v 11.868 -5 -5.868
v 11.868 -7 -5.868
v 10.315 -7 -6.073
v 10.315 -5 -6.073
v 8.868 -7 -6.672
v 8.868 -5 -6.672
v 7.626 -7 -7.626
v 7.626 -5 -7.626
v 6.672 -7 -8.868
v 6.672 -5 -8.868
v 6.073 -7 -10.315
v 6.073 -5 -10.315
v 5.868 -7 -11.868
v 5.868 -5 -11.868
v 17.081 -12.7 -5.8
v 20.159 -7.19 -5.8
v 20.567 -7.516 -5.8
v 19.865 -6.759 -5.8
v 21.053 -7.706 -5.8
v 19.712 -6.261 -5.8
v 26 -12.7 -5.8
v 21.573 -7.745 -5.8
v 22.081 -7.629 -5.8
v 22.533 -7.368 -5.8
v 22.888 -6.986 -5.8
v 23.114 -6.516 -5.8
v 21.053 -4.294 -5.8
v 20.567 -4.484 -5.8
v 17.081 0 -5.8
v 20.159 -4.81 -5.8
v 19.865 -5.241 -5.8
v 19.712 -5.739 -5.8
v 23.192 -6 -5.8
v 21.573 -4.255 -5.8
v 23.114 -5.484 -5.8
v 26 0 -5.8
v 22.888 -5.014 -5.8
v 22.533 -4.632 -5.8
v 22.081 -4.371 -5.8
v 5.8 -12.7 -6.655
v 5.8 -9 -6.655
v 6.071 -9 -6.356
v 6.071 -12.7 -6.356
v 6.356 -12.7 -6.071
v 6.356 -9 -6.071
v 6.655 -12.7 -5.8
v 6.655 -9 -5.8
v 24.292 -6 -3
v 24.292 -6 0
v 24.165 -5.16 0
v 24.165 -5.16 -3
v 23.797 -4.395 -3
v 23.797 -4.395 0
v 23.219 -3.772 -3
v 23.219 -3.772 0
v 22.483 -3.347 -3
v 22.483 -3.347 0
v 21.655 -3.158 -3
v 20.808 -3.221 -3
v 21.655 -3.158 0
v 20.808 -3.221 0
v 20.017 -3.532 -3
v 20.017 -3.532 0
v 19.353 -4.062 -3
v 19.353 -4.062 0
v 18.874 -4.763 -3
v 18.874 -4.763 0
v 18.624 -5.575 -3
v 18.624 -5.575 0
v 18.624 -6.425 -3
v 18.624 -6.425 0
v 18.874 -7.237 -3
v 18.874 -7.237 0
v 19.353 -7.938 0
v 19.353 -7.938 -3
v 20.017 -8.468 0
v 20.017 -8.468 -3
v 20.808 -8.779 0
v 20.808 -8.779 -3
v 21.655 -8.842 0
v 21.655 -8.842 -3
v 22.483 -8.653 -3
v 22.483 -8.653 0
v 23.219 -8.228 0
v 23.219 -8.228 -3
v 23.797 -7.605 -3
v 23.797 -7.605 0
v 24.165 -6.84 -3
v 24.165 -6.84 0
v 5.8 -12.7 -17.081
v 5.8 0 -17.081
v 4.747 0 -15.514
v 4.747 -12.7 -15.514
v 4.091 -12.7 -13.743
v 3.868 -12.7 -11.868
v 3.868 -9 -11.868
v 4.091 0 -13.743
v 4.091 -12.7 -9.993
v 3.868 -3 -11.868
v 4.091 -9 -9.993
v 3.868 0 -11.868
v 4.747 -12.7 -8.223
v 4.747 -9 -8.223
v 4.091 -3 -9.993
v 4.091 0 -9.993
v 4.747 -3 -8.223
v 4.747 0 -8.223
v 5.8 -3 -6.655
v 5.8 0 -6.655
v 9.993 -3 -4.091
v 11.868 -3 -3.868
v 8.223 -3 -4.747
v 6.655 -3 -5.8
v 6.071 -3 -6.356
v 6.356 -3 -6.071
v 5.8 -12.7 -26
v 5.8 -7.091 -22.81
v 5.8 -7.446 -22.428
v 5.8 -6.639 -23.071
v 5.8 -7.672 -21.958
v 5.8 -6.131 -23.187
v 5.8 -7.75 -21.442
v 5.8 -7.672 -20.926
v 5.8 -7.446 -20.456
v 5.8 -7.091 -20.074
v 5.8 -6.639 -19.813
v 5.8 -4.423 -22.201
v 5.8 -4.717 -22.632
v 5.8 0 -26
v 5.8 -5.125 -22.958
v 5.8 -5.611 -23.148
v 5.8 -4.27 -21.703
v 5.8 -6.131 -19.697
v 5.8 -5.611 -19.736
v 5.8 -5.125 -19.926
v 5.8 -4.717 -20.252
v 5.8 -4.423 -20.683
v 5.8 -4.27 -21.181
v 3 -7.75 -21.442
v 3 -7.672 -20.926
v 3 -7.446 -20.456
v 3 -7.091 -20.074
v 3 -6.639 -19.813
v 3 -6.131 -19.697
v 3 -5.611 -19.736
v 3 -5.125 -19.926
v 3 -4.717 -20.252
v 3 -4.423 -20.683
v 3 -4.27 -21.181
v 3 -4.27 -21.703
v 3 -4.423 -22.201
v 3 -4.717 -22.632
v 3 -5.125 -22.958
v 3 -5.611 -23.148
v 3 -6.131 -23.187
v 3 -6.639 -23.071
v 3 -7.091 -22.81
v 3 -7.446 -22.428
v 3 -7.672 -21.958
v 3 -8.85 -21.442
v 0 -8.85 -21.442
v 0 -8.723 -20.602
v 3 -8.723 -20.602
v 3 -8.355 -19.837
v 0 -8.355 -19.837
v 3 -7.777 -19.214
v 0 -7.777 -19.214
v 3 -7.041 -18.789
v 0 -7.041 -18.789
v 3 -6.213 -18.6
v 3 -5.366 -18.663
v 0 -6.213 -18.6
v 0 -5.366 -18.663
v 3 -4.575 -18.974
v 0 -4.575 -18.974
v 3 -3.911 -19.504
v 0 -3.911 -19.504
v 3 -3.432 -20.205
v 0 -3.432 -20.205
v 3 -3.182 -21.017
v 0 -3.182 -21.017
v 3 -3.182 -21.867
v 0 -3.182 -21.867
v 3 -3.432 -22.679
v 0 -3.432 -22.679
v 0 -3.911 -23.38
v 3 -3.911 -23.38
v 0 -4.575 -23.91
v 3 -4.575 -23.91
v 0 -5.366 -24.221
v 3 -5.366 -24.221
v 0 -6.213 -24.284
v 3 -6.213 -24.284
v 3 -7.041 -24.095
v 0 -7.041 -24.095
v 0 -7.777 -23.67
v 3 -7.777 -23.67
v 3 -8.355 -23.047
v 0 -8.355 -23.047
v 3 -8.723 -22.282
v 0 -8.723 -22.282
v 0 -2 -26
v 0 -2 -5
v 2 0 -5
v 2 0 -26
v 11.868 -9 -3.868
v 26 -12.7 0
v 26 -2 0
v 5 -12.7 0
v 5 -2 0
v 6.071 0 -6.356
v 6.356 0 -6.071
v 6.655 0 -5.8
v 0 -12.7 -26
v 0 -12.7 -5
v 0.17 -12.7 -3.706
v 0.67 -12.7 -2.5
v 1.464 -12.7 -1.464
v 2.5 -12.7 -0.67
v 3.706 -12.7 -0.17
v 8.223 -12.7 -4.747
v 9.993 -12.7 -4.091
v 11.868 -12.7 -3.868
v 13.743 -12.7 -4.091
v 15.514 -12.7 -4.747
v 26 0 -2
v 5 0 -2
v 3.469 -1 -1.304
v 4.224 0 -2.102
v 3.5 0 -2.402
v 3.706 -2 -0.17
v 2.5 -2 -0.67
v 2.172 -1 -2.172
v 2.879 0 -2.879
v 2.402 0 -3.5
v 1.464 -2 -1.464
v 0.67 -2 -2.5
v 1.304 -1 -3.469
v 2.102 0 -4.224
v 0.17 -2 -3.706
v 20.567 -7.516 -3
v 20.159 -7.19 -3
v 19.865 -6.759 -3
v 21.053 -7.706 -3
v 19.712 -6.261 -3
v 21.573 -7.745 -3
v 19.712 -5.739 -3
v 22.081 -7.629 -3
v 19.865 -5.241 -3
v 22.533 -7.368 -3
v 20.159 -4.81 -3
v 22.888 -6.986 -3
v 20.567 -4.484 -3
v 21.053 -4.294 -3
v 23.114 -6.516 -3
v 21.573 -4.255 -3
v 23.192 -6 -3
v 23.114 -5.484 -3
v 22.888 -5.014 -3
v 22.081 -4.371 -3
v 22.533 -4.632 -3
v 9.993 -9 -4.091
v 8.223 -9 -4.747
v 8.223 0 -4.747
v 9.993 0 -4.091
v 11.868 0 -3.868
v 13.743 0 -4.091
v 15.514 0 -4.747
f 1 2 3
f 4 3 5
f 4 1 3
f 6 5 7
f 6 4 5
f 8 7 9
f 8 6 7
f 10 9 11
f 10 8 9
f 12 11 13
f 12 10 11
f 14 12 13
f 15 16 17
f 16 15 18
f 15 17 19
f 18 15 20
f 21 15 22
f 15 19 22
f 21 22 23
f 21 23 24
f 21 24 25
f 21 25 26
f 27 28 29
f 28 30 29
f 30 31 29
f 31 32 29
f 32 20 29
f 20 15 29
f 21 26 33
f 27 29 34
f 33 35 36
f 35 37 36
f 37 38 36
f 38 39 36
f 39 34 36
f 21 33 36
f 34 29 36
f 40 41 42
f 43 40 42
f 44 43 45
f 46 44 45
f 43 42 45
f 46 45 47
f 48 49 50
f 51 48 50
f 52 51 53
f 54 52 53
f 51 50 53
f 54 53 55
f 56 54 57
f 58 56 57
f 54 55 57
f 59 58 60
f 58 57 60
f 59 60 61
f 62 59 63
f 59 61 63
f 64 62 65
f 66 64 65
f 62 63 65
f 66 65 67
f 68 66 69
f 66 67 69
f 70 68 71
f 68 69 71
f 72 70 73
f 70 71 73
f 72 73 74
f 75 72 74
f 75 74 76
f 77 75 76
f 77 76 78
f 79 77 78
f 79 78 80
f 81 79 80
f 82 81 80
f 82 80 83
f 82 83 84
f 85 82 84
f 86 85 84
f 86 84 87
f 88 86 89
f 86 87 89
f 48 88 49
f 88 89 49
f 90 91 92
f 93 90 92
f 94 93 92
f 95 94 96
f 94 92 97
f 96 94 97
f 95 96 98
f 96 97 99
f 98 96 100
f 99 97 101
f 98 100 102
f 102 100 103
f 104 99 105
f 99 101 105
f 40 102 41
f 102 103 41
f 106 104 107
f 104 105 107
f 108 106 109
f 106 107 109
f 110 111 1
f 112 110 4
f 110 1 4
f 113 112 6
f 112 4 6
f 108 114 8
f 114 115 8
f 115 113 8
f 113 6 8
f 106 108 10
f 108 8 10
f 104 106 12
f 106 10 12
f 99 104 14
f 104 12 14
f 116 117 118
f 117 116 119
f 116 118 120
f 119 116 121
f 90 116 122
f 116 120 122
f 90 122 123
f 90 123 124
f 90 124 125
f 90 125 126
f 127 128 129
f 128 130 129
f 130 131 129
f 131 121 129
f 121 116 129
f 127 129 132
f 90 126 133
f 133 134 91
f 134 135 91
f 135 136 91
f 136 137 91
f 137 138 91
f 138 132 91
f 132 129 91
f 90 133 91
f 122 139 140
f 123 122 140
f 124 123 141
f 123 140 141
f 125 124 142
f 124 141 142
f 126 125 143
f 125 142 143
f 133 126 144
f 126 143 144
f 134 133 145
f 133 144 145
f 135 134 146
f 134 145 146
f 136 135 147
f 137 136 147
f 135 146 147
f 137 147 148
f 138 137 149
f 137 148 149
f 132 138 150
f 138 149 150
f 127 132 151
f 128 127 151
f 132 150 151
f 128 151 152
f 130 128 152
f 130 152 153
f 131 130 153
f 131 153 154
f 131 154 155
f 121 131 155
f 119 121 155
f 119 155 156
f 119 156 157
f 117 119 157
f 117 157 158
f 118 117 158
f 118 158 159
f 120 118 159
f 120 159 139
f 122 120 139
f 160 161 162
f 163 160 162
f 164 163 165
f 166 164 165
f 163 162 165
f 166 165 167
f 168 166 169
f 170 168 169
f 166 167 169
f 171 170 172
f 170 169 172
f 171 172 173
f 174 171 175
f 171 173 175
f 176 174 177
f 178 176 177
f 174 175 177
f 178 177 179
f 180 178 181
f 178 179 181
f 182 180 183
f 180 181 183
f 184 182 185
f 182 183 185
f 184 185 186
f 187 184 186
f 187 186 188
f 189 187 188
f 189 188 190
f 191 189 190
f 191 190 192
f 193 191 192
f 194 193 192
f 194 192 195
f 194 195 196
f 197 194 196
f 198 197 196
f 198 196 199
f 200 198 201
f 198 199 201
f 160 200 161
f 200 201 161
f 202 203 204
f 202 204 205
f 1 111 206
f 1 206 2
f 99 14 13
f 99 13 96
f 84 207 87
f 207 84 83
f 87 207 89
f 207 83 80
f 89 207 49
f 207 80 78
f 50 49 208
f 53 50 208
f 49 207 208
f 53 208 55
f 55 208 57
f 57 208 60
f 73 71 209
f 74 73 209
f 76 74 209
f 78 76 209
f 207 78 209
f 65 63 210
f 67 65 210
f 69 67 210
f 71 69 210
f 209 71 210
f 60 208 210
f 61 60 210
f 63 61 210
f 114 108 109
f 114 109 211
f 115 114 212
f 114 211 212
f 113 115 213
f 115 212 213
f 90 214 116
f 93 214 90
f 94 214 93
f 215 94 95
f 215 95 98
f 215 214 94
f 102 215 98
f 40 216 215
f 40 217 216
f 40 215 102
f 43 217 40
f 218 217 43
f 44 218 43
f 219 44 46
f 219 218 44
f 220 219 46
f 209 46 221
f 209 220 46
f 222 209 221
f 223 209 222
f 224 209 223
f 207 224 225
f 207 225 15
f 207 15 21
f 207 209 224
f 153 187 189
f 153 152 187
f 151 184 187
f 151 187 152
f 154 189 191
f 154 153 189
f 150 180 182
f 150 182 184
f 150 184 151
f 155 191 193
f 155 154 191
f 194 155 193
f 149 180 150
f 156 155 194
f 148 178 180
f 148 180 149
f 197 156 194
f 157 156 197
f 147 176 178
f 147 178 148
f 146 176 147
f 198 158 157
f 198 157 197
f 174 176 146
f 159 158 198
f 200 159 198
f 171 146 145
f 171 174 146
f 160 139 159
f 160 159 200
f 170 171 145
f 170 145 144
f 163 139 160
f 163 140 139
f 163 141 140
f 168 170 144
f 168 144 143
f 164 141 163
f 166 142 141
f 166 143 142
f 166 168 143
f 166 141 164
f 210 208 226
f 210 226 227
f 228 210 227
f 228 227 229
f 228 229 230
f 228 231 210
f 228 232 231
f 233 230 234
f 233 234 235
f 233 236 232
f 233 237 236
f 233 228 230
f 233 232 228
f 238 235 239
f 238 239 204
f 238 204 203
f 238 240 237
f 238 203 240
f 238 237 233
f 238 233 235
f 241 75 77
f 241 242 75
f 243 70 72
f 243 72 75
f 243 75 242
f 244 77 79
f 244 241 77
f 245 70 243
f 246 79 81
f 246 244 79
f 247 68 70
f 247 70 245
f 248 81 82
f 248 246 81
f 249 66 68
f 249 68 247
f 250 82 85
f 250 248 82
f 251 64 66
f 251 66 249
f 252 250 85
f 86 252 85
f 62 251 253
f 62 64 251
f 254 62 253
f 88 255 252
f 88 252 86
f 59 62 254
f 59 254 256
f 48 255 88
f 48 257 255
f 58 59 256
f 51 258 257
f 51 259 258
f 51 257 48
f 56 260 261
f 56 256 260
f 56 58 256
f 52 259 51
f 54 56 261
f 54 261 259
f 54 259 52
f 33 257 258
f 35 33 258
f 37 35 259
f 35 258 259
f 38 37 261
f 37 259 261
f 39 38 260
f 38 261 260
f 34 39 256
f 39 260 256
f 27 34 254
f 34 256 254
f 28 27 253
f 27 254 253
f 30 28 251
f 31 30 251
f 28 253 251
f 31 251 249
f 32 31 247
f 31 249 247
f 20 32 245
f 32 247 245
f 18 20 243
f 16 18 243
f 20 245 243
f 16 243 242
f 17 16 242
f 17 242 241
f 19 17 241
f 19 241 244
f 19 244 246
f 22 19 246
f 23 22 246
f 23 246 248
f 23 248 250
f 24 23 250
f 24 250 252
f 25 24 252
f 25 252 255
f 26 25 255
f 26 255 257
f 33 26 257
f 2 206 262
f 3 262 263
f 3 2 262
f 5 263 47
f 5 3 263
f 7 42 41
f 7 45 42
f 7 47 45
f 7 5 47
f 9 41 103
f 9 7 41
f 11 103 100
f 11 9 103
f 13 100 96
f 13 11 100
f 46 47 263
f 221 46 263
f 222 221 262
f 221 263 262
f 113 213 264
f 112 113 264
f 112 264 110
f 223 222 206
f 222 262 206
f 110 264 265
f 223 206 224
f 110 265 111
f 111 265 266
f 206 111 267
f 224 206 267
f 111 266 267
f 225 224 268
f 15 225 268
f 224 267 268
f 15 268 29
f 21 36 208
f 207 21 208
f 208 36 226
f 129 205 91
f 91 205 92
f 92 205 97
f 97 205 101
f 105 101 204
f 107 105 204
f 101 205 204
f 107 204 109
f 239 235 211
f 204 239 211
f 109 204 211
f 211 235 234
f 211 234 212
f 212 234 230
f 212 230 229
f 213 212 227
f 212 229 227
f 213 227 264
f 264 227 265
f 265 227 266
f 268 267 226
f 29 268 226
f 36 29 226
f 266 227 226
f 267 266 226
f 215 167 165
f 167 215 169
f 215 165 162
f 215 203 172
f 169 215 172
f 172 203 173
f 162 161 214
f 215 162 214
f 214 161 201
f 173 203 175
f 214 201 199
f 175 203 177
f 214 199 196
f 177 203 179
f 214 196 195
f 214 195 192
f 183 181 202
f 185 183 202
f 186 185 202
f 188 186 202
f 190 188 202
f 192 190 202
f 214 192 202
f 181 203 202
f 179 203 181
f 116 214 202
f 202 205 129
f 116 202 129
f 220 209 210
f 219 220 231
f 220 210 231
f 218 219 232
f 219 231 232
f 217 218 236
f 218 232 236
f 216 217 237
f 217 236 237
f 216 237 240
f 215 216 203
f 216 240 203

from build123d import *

# Parameters (mm, degrees)
F1_DEPTH     = 12.7
F3_R         = 1.75
F4_DEPTH     = 26.001
F5_R         = 1.75
F6_DEPTH     = 26.001
F8_DEPTH     = 3
F9_T4_ANGLE  = 188.2705145196
F9_S5_R      = 8
F9_T6_DEPTH  = 11
F9_T10_ANGLE = 188.2705145196
F9_S11_R     = 8
F9_T12_DEPTH = 11
F10_R        = 2.85
F10_R_2      = 1.75
F11_DEPTH    = 3
F12_R        = 2.85
F13_DEPTH    = 3
F14_T1_DEPTH = 37.7
F15_SIZE     = 2


# Not quite as in the source:
# - a fillet or chamfer that OpenCascade refuses, or shapes differently, is made with other operations: its cross-section is extruded or revolved along the edge and cut away or added


with BuildPart() as f1:
    # F0 (on Front) → F1 (new body)
    with BuildSketch(Plane.XZ):
        with BuildLine():
            Line((26, 0), (0, 0))
            Line((0, 0), (0, -26))
            Line((0, -26), (5.8, -26))
            Line((5.8, -26), (5.8, -17.0813202825))
            ThreePointArc((5.8, -17.0813202825), (3.8683903961, -11.8683903961), (5.8, -6.6554605098))
            Line((5.8, -6.6554605098), (5.8, -5.8))
            Line((5.8, -5.8), (6.6554605098, -5.8))
            ThreePointArc((6.6554605098, -5.8), (11.8683903961, -3.8683903961), (17.0813202825, -5.8))
            Line((17.0813202825, -5.8), (26, -5.8))
            Line((26, -5.8), (26, 0))
        make_face()
        with BuildLine():
            ThreePointArc((5.8, -6.6554605098), (6.2115361467, -6.2115361467), (6.6554605098, -5.8))
            Line((6.6554605098, -5.8), (5.8, -5.8))
            Line((5.8, -5.8), (5.8, -6.6554605098))
        make_face()
    extrude(amount=F1_DEPTH)

    # F3 (on face) → F4 (cut, through all)
    with BuildSketch(Plane.XY):
        with Locations((21.442, -6)):
            Circle(F3_R)
    extrude(amount=-F4_DEPTH, mode=Mode.SUBTRACT)

    # F5 (on face) → F6 (cut, through all)
    with BuildSketch(Plane(origin=(0, 0, 0), x_dir=(0, -1, 0), z_dir=(-1, 0, 0))):
        with Locations((6, -21.442)):
            Circle(F5_R)
    extrude(amount=-F6_DEPTH, mode=Mode.SUBTRACT)

    # F7 (on offset) → F8 (join, symmetric)
    with BuildSketch(Plane(origin=(0, -6, 0), x_dir=(-1, 0, 0), z_dir=(0, 1, 0))):
        with BuildLine():
            ThreePointArc((-3.8683903961, -11.8683903961), (-6.2115361467, -6.2115361467), (-11.8683903961, -3.8683903961))
            Line((-11.8683903961, -3.8683903961), (-11.8683903961, -5.8683903961))
            ThreePointArc((-11.8683903961, -5.8683903961), (-7.625749709, -7.625749709), (-5.8683903961, -11.8683903961))
            Line((-5.8683903961, -11.8683903961), (-3.8683903961, -11.8683903961))
        make_face()
    extrude(amount=F8_DEPTH, both=True)

    # F9: chamfer of 2 on 2 edges, made by hand


with BuildPart() as f9_tool2:
    # F9_s3 → F9_t4 (revolve)
    with BuildSketch(Plane(origin=(10.953058548, 0, -12.6602903485), x_dir=(0, 1, 0), z_dir=(0.6542755714, 0, -0.7562562242))):
        Polygon((-9, 9.2103462012), (-7, 7.2103462012), (-9, 7.2103462012), align=None)
    revolve(axis=Axis((11.8683903961, -9, -11.8683903961), (0, -1, 0)), revolution_arc=F9_T4_ANGLE)

    # F9_s5 → F9_t6 (intersect, symmetric)
    with BuildSketch(Plane.XZ.offset(8)):
        with Locations((11.8683903961, -11.8683903961)):
            Circle(F9_S5_R)
    extrude(amount=F9_T6_DEPTH, both=True, mode=Mode.INTERSECT)


with BuildPart() as f1_1:
    add(f1.part)

    # F9_t1: cut F9_tool2
    add(f9_tool2.part, mode=Mode.SUBTRACT)


with BuildPart() as f9_tool8:
    # F9_s9 → F9_t10 (revolve)
    with BuildSketch(Plane(origin=(10.953058548, 0, -12.6602903485), x_dir=(0, 1, 0), z_dir=(0.6542755714, 0, -0.7562562242))):
        Polygon((-3, 9.2103462012), (-5, 7.2103462012), (-3, 7.2103462012), align=None)
    revolve(axis=Axis((11.8683903961, -3, -11.8683903961), (0, -1, 0)), revolution_arc=F9_T10_ANGLE)

    # F9_s11 → F9_t12 (intersect, symmetric)
    with BuildSketch(Plane.XZ.offset(4)):
        with Locations((11.8683903961, -11.8683903961)):
            Circle(F9_S11_R)
    extrude(amount=F9_T12_DEPTH, both=True, mode=Mode.INTERSECT)


with BuildPart() as f1_2:
    add(f1_1.part)

    # F9_t7: cut F9_tool8
    add(f9_tool8.part, mode=Mode.SUBTRACT)

    # F10 (on face) → F11 (cut)
    with BuildSketch(Plane(origin=(0, 0, 0), x_dir=(0, -1, 0), z_dir=(-1, 0, 0))):
        with Locations((6, -21.442)):
            Circle(F10_R)
        with Locations((6, -21.442)):
            Circle(F10_R_2, mode=Mode.SUBTRACT)
    extrude(amount=-F11_DEPTH, mode=Mode.SUBTRACT)

    # F12 (on face) → F13 (cut)
    with BuildSketch(Plane.XY):
        with Locations((21.442, -6)):
            Circle(F12_R)
    extrude(amount=-F13_DEPTH, mode=Mode.SUBTRACT)

    # F14: fillet of radius 5 on 1 edges, made by hand

    # F14_s2 → F14_t1 (cut)
    with BuildSketch(Plane.XZ.offset(-12.5)):
        with BuildLine():
            ThreePointArc((5, 0), (1.4644660941, -1.4644660941), (0, -5))
            Line((0, -5), (0, 0))
            Line((0, 0), (5, 0))
        make_face()
    extrude(amount=F14_T1_DEPTH, mode=Mode.SUBTRACT)

    # F15
    f15_edges = [f1_2.edges().sort_by_distance(p)[0] for p in [
        (0, 0, -15.5),
        (1.464466, 0, -1.464466),
        (15.5, 0, 0),
    ]]
    chamfer(f15_edges, length=F15_SIZE)


solid = f1_2.part
